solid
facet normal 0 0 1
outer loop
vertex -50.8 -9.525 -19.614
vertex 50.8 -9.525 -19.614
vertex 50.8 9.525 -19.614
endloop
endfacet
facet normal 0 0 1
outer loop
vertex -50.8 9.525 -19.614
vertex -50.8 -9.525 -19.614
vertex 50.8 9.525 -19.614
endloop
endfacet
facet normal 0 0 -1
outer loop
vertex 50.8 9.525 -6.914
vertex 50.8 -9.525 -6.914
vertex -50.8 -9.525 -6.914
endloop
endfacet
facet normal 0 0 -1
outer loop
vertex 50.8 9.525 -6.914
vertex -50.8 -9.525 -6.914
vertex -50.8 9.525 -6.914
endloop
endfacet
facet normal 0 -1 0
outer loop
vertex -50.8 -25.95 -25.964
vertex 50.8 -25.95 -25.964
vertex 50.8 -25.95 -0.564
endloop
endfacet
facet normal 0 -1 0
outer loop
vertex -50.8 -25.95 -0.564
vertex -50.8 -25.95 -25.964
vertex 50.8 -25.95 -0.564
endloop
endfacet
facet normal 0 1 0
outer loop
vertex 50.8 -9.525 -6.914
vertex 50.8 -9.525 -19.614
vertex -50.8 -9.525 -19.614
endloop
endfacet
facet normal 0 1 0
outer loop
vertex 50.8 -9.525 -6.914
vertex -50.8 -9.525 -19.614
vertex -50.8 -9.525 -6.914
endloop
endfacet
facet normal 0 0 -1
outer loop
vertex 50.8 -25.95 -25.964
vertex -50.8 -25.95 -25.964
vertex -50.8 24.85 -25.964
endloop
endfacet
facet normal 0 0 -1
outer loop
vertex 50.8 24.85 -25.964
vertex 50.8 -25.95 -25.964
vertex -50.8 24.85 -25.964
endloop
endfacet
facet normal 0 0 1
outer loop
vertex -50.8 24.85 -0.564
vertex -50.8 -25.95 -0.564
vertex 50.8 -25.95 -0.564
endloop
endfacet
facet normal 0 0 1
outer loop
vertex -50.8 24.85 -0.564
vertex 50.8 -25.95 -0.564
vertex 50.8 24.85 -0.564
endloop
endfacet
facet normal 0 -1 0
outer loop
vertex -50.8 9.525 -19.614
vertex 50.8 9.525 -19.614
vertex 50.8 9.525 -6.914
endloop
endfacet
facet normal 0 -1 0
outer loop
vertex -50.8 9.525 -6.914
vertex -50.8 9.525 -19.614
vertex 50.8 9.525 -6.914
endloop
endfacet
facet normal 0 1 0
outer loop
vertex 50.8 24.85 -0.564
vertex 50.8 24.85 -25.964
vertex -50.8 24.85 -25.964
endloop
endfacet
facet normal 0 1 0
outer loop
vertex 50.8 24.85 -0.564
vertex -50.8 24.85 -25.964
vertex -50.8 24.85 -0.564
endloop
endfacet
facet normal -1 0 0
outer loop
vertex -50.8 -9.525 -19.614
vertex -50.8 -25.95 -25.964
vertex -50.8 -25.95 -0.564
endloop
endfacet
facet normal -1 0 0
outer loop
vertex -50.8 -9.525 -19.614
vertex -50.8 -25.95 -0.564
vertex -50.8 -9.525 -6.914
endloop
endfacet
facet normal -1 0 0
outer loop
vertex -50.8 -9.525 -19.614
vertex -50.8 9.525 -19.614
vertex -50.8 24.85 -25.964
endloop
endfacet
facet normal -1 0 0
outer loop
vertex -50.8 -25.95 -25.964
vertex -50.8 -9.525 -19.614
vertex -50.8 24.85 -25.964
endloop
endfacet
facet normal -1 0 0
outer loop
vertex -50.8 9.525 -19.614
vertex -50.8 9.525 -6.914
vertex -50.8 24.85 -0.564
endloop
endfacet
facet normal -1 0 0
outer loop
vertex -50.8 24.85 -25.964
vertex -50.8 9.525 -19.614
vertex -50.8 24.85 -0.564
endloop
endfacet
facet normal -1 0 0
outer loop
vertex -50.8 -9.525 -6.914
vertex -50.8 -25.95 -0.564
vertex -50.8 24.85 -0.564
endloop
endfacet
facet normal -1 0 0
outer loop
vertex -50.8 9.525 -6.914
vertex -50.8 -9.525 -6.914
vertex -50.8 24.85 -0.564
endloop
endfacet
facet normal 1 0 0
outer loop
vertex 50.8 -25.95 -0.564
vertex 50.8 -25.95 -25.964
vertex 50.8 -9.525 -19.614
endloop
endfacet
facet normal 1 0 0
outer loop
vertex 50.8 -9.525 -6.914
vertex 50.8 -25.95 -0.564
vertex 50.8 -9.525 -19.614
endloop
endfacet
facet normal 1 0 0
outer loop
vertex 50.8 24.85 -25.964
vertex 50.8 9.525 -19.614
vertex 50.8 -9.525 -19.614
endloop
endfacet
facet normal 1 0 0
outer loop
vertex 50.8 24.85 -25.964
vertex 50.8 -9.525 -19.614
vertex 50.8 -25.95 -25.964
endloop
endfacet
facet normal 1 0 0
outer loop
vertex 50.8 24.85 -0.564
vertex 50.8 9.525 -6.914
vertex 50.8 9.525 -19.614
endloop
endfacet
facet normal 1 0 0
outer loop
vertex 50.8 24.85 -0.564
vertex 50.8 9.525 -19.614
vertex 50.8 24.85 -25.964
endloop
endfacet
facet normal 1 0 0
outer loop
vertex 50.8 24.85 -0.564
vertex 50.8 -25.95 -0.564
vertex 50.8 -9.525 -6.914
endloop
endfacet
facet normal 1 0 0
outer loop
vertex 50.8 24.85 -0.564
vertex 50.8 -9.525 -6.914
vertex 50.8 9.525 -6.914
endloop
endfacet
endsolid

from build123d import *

# Parameters (mm, degrees)
F0_W     = 50.8
F0_H     = 25.4
F1_DEPTH = 50.8
F2_W     = 19.05
F2_H     = 12.7
F3_DEPTH = 121.595184


with BuildPart() as f1:
    # F0 (on Right) → F1 (new body, symmetric)
    with BuildSketch(Plane.YZ):
        with Locations((-0.54992, -13.264191)):
            Rectangle(F0_W, F0_H)
    extrude(amount=F1_DEPTH, both=True)

    # F2 (on Right) → F3 (cut, symmetric)
    with BuildSketch(Plane.YZ):
        with Locations((0, -13.264191)):
            Rectangle(F2_W, F2_H)
    extrude(amount=F3_DEPTH, both=True, mode=Mode.SUBTRACT)


solid = f1.part
